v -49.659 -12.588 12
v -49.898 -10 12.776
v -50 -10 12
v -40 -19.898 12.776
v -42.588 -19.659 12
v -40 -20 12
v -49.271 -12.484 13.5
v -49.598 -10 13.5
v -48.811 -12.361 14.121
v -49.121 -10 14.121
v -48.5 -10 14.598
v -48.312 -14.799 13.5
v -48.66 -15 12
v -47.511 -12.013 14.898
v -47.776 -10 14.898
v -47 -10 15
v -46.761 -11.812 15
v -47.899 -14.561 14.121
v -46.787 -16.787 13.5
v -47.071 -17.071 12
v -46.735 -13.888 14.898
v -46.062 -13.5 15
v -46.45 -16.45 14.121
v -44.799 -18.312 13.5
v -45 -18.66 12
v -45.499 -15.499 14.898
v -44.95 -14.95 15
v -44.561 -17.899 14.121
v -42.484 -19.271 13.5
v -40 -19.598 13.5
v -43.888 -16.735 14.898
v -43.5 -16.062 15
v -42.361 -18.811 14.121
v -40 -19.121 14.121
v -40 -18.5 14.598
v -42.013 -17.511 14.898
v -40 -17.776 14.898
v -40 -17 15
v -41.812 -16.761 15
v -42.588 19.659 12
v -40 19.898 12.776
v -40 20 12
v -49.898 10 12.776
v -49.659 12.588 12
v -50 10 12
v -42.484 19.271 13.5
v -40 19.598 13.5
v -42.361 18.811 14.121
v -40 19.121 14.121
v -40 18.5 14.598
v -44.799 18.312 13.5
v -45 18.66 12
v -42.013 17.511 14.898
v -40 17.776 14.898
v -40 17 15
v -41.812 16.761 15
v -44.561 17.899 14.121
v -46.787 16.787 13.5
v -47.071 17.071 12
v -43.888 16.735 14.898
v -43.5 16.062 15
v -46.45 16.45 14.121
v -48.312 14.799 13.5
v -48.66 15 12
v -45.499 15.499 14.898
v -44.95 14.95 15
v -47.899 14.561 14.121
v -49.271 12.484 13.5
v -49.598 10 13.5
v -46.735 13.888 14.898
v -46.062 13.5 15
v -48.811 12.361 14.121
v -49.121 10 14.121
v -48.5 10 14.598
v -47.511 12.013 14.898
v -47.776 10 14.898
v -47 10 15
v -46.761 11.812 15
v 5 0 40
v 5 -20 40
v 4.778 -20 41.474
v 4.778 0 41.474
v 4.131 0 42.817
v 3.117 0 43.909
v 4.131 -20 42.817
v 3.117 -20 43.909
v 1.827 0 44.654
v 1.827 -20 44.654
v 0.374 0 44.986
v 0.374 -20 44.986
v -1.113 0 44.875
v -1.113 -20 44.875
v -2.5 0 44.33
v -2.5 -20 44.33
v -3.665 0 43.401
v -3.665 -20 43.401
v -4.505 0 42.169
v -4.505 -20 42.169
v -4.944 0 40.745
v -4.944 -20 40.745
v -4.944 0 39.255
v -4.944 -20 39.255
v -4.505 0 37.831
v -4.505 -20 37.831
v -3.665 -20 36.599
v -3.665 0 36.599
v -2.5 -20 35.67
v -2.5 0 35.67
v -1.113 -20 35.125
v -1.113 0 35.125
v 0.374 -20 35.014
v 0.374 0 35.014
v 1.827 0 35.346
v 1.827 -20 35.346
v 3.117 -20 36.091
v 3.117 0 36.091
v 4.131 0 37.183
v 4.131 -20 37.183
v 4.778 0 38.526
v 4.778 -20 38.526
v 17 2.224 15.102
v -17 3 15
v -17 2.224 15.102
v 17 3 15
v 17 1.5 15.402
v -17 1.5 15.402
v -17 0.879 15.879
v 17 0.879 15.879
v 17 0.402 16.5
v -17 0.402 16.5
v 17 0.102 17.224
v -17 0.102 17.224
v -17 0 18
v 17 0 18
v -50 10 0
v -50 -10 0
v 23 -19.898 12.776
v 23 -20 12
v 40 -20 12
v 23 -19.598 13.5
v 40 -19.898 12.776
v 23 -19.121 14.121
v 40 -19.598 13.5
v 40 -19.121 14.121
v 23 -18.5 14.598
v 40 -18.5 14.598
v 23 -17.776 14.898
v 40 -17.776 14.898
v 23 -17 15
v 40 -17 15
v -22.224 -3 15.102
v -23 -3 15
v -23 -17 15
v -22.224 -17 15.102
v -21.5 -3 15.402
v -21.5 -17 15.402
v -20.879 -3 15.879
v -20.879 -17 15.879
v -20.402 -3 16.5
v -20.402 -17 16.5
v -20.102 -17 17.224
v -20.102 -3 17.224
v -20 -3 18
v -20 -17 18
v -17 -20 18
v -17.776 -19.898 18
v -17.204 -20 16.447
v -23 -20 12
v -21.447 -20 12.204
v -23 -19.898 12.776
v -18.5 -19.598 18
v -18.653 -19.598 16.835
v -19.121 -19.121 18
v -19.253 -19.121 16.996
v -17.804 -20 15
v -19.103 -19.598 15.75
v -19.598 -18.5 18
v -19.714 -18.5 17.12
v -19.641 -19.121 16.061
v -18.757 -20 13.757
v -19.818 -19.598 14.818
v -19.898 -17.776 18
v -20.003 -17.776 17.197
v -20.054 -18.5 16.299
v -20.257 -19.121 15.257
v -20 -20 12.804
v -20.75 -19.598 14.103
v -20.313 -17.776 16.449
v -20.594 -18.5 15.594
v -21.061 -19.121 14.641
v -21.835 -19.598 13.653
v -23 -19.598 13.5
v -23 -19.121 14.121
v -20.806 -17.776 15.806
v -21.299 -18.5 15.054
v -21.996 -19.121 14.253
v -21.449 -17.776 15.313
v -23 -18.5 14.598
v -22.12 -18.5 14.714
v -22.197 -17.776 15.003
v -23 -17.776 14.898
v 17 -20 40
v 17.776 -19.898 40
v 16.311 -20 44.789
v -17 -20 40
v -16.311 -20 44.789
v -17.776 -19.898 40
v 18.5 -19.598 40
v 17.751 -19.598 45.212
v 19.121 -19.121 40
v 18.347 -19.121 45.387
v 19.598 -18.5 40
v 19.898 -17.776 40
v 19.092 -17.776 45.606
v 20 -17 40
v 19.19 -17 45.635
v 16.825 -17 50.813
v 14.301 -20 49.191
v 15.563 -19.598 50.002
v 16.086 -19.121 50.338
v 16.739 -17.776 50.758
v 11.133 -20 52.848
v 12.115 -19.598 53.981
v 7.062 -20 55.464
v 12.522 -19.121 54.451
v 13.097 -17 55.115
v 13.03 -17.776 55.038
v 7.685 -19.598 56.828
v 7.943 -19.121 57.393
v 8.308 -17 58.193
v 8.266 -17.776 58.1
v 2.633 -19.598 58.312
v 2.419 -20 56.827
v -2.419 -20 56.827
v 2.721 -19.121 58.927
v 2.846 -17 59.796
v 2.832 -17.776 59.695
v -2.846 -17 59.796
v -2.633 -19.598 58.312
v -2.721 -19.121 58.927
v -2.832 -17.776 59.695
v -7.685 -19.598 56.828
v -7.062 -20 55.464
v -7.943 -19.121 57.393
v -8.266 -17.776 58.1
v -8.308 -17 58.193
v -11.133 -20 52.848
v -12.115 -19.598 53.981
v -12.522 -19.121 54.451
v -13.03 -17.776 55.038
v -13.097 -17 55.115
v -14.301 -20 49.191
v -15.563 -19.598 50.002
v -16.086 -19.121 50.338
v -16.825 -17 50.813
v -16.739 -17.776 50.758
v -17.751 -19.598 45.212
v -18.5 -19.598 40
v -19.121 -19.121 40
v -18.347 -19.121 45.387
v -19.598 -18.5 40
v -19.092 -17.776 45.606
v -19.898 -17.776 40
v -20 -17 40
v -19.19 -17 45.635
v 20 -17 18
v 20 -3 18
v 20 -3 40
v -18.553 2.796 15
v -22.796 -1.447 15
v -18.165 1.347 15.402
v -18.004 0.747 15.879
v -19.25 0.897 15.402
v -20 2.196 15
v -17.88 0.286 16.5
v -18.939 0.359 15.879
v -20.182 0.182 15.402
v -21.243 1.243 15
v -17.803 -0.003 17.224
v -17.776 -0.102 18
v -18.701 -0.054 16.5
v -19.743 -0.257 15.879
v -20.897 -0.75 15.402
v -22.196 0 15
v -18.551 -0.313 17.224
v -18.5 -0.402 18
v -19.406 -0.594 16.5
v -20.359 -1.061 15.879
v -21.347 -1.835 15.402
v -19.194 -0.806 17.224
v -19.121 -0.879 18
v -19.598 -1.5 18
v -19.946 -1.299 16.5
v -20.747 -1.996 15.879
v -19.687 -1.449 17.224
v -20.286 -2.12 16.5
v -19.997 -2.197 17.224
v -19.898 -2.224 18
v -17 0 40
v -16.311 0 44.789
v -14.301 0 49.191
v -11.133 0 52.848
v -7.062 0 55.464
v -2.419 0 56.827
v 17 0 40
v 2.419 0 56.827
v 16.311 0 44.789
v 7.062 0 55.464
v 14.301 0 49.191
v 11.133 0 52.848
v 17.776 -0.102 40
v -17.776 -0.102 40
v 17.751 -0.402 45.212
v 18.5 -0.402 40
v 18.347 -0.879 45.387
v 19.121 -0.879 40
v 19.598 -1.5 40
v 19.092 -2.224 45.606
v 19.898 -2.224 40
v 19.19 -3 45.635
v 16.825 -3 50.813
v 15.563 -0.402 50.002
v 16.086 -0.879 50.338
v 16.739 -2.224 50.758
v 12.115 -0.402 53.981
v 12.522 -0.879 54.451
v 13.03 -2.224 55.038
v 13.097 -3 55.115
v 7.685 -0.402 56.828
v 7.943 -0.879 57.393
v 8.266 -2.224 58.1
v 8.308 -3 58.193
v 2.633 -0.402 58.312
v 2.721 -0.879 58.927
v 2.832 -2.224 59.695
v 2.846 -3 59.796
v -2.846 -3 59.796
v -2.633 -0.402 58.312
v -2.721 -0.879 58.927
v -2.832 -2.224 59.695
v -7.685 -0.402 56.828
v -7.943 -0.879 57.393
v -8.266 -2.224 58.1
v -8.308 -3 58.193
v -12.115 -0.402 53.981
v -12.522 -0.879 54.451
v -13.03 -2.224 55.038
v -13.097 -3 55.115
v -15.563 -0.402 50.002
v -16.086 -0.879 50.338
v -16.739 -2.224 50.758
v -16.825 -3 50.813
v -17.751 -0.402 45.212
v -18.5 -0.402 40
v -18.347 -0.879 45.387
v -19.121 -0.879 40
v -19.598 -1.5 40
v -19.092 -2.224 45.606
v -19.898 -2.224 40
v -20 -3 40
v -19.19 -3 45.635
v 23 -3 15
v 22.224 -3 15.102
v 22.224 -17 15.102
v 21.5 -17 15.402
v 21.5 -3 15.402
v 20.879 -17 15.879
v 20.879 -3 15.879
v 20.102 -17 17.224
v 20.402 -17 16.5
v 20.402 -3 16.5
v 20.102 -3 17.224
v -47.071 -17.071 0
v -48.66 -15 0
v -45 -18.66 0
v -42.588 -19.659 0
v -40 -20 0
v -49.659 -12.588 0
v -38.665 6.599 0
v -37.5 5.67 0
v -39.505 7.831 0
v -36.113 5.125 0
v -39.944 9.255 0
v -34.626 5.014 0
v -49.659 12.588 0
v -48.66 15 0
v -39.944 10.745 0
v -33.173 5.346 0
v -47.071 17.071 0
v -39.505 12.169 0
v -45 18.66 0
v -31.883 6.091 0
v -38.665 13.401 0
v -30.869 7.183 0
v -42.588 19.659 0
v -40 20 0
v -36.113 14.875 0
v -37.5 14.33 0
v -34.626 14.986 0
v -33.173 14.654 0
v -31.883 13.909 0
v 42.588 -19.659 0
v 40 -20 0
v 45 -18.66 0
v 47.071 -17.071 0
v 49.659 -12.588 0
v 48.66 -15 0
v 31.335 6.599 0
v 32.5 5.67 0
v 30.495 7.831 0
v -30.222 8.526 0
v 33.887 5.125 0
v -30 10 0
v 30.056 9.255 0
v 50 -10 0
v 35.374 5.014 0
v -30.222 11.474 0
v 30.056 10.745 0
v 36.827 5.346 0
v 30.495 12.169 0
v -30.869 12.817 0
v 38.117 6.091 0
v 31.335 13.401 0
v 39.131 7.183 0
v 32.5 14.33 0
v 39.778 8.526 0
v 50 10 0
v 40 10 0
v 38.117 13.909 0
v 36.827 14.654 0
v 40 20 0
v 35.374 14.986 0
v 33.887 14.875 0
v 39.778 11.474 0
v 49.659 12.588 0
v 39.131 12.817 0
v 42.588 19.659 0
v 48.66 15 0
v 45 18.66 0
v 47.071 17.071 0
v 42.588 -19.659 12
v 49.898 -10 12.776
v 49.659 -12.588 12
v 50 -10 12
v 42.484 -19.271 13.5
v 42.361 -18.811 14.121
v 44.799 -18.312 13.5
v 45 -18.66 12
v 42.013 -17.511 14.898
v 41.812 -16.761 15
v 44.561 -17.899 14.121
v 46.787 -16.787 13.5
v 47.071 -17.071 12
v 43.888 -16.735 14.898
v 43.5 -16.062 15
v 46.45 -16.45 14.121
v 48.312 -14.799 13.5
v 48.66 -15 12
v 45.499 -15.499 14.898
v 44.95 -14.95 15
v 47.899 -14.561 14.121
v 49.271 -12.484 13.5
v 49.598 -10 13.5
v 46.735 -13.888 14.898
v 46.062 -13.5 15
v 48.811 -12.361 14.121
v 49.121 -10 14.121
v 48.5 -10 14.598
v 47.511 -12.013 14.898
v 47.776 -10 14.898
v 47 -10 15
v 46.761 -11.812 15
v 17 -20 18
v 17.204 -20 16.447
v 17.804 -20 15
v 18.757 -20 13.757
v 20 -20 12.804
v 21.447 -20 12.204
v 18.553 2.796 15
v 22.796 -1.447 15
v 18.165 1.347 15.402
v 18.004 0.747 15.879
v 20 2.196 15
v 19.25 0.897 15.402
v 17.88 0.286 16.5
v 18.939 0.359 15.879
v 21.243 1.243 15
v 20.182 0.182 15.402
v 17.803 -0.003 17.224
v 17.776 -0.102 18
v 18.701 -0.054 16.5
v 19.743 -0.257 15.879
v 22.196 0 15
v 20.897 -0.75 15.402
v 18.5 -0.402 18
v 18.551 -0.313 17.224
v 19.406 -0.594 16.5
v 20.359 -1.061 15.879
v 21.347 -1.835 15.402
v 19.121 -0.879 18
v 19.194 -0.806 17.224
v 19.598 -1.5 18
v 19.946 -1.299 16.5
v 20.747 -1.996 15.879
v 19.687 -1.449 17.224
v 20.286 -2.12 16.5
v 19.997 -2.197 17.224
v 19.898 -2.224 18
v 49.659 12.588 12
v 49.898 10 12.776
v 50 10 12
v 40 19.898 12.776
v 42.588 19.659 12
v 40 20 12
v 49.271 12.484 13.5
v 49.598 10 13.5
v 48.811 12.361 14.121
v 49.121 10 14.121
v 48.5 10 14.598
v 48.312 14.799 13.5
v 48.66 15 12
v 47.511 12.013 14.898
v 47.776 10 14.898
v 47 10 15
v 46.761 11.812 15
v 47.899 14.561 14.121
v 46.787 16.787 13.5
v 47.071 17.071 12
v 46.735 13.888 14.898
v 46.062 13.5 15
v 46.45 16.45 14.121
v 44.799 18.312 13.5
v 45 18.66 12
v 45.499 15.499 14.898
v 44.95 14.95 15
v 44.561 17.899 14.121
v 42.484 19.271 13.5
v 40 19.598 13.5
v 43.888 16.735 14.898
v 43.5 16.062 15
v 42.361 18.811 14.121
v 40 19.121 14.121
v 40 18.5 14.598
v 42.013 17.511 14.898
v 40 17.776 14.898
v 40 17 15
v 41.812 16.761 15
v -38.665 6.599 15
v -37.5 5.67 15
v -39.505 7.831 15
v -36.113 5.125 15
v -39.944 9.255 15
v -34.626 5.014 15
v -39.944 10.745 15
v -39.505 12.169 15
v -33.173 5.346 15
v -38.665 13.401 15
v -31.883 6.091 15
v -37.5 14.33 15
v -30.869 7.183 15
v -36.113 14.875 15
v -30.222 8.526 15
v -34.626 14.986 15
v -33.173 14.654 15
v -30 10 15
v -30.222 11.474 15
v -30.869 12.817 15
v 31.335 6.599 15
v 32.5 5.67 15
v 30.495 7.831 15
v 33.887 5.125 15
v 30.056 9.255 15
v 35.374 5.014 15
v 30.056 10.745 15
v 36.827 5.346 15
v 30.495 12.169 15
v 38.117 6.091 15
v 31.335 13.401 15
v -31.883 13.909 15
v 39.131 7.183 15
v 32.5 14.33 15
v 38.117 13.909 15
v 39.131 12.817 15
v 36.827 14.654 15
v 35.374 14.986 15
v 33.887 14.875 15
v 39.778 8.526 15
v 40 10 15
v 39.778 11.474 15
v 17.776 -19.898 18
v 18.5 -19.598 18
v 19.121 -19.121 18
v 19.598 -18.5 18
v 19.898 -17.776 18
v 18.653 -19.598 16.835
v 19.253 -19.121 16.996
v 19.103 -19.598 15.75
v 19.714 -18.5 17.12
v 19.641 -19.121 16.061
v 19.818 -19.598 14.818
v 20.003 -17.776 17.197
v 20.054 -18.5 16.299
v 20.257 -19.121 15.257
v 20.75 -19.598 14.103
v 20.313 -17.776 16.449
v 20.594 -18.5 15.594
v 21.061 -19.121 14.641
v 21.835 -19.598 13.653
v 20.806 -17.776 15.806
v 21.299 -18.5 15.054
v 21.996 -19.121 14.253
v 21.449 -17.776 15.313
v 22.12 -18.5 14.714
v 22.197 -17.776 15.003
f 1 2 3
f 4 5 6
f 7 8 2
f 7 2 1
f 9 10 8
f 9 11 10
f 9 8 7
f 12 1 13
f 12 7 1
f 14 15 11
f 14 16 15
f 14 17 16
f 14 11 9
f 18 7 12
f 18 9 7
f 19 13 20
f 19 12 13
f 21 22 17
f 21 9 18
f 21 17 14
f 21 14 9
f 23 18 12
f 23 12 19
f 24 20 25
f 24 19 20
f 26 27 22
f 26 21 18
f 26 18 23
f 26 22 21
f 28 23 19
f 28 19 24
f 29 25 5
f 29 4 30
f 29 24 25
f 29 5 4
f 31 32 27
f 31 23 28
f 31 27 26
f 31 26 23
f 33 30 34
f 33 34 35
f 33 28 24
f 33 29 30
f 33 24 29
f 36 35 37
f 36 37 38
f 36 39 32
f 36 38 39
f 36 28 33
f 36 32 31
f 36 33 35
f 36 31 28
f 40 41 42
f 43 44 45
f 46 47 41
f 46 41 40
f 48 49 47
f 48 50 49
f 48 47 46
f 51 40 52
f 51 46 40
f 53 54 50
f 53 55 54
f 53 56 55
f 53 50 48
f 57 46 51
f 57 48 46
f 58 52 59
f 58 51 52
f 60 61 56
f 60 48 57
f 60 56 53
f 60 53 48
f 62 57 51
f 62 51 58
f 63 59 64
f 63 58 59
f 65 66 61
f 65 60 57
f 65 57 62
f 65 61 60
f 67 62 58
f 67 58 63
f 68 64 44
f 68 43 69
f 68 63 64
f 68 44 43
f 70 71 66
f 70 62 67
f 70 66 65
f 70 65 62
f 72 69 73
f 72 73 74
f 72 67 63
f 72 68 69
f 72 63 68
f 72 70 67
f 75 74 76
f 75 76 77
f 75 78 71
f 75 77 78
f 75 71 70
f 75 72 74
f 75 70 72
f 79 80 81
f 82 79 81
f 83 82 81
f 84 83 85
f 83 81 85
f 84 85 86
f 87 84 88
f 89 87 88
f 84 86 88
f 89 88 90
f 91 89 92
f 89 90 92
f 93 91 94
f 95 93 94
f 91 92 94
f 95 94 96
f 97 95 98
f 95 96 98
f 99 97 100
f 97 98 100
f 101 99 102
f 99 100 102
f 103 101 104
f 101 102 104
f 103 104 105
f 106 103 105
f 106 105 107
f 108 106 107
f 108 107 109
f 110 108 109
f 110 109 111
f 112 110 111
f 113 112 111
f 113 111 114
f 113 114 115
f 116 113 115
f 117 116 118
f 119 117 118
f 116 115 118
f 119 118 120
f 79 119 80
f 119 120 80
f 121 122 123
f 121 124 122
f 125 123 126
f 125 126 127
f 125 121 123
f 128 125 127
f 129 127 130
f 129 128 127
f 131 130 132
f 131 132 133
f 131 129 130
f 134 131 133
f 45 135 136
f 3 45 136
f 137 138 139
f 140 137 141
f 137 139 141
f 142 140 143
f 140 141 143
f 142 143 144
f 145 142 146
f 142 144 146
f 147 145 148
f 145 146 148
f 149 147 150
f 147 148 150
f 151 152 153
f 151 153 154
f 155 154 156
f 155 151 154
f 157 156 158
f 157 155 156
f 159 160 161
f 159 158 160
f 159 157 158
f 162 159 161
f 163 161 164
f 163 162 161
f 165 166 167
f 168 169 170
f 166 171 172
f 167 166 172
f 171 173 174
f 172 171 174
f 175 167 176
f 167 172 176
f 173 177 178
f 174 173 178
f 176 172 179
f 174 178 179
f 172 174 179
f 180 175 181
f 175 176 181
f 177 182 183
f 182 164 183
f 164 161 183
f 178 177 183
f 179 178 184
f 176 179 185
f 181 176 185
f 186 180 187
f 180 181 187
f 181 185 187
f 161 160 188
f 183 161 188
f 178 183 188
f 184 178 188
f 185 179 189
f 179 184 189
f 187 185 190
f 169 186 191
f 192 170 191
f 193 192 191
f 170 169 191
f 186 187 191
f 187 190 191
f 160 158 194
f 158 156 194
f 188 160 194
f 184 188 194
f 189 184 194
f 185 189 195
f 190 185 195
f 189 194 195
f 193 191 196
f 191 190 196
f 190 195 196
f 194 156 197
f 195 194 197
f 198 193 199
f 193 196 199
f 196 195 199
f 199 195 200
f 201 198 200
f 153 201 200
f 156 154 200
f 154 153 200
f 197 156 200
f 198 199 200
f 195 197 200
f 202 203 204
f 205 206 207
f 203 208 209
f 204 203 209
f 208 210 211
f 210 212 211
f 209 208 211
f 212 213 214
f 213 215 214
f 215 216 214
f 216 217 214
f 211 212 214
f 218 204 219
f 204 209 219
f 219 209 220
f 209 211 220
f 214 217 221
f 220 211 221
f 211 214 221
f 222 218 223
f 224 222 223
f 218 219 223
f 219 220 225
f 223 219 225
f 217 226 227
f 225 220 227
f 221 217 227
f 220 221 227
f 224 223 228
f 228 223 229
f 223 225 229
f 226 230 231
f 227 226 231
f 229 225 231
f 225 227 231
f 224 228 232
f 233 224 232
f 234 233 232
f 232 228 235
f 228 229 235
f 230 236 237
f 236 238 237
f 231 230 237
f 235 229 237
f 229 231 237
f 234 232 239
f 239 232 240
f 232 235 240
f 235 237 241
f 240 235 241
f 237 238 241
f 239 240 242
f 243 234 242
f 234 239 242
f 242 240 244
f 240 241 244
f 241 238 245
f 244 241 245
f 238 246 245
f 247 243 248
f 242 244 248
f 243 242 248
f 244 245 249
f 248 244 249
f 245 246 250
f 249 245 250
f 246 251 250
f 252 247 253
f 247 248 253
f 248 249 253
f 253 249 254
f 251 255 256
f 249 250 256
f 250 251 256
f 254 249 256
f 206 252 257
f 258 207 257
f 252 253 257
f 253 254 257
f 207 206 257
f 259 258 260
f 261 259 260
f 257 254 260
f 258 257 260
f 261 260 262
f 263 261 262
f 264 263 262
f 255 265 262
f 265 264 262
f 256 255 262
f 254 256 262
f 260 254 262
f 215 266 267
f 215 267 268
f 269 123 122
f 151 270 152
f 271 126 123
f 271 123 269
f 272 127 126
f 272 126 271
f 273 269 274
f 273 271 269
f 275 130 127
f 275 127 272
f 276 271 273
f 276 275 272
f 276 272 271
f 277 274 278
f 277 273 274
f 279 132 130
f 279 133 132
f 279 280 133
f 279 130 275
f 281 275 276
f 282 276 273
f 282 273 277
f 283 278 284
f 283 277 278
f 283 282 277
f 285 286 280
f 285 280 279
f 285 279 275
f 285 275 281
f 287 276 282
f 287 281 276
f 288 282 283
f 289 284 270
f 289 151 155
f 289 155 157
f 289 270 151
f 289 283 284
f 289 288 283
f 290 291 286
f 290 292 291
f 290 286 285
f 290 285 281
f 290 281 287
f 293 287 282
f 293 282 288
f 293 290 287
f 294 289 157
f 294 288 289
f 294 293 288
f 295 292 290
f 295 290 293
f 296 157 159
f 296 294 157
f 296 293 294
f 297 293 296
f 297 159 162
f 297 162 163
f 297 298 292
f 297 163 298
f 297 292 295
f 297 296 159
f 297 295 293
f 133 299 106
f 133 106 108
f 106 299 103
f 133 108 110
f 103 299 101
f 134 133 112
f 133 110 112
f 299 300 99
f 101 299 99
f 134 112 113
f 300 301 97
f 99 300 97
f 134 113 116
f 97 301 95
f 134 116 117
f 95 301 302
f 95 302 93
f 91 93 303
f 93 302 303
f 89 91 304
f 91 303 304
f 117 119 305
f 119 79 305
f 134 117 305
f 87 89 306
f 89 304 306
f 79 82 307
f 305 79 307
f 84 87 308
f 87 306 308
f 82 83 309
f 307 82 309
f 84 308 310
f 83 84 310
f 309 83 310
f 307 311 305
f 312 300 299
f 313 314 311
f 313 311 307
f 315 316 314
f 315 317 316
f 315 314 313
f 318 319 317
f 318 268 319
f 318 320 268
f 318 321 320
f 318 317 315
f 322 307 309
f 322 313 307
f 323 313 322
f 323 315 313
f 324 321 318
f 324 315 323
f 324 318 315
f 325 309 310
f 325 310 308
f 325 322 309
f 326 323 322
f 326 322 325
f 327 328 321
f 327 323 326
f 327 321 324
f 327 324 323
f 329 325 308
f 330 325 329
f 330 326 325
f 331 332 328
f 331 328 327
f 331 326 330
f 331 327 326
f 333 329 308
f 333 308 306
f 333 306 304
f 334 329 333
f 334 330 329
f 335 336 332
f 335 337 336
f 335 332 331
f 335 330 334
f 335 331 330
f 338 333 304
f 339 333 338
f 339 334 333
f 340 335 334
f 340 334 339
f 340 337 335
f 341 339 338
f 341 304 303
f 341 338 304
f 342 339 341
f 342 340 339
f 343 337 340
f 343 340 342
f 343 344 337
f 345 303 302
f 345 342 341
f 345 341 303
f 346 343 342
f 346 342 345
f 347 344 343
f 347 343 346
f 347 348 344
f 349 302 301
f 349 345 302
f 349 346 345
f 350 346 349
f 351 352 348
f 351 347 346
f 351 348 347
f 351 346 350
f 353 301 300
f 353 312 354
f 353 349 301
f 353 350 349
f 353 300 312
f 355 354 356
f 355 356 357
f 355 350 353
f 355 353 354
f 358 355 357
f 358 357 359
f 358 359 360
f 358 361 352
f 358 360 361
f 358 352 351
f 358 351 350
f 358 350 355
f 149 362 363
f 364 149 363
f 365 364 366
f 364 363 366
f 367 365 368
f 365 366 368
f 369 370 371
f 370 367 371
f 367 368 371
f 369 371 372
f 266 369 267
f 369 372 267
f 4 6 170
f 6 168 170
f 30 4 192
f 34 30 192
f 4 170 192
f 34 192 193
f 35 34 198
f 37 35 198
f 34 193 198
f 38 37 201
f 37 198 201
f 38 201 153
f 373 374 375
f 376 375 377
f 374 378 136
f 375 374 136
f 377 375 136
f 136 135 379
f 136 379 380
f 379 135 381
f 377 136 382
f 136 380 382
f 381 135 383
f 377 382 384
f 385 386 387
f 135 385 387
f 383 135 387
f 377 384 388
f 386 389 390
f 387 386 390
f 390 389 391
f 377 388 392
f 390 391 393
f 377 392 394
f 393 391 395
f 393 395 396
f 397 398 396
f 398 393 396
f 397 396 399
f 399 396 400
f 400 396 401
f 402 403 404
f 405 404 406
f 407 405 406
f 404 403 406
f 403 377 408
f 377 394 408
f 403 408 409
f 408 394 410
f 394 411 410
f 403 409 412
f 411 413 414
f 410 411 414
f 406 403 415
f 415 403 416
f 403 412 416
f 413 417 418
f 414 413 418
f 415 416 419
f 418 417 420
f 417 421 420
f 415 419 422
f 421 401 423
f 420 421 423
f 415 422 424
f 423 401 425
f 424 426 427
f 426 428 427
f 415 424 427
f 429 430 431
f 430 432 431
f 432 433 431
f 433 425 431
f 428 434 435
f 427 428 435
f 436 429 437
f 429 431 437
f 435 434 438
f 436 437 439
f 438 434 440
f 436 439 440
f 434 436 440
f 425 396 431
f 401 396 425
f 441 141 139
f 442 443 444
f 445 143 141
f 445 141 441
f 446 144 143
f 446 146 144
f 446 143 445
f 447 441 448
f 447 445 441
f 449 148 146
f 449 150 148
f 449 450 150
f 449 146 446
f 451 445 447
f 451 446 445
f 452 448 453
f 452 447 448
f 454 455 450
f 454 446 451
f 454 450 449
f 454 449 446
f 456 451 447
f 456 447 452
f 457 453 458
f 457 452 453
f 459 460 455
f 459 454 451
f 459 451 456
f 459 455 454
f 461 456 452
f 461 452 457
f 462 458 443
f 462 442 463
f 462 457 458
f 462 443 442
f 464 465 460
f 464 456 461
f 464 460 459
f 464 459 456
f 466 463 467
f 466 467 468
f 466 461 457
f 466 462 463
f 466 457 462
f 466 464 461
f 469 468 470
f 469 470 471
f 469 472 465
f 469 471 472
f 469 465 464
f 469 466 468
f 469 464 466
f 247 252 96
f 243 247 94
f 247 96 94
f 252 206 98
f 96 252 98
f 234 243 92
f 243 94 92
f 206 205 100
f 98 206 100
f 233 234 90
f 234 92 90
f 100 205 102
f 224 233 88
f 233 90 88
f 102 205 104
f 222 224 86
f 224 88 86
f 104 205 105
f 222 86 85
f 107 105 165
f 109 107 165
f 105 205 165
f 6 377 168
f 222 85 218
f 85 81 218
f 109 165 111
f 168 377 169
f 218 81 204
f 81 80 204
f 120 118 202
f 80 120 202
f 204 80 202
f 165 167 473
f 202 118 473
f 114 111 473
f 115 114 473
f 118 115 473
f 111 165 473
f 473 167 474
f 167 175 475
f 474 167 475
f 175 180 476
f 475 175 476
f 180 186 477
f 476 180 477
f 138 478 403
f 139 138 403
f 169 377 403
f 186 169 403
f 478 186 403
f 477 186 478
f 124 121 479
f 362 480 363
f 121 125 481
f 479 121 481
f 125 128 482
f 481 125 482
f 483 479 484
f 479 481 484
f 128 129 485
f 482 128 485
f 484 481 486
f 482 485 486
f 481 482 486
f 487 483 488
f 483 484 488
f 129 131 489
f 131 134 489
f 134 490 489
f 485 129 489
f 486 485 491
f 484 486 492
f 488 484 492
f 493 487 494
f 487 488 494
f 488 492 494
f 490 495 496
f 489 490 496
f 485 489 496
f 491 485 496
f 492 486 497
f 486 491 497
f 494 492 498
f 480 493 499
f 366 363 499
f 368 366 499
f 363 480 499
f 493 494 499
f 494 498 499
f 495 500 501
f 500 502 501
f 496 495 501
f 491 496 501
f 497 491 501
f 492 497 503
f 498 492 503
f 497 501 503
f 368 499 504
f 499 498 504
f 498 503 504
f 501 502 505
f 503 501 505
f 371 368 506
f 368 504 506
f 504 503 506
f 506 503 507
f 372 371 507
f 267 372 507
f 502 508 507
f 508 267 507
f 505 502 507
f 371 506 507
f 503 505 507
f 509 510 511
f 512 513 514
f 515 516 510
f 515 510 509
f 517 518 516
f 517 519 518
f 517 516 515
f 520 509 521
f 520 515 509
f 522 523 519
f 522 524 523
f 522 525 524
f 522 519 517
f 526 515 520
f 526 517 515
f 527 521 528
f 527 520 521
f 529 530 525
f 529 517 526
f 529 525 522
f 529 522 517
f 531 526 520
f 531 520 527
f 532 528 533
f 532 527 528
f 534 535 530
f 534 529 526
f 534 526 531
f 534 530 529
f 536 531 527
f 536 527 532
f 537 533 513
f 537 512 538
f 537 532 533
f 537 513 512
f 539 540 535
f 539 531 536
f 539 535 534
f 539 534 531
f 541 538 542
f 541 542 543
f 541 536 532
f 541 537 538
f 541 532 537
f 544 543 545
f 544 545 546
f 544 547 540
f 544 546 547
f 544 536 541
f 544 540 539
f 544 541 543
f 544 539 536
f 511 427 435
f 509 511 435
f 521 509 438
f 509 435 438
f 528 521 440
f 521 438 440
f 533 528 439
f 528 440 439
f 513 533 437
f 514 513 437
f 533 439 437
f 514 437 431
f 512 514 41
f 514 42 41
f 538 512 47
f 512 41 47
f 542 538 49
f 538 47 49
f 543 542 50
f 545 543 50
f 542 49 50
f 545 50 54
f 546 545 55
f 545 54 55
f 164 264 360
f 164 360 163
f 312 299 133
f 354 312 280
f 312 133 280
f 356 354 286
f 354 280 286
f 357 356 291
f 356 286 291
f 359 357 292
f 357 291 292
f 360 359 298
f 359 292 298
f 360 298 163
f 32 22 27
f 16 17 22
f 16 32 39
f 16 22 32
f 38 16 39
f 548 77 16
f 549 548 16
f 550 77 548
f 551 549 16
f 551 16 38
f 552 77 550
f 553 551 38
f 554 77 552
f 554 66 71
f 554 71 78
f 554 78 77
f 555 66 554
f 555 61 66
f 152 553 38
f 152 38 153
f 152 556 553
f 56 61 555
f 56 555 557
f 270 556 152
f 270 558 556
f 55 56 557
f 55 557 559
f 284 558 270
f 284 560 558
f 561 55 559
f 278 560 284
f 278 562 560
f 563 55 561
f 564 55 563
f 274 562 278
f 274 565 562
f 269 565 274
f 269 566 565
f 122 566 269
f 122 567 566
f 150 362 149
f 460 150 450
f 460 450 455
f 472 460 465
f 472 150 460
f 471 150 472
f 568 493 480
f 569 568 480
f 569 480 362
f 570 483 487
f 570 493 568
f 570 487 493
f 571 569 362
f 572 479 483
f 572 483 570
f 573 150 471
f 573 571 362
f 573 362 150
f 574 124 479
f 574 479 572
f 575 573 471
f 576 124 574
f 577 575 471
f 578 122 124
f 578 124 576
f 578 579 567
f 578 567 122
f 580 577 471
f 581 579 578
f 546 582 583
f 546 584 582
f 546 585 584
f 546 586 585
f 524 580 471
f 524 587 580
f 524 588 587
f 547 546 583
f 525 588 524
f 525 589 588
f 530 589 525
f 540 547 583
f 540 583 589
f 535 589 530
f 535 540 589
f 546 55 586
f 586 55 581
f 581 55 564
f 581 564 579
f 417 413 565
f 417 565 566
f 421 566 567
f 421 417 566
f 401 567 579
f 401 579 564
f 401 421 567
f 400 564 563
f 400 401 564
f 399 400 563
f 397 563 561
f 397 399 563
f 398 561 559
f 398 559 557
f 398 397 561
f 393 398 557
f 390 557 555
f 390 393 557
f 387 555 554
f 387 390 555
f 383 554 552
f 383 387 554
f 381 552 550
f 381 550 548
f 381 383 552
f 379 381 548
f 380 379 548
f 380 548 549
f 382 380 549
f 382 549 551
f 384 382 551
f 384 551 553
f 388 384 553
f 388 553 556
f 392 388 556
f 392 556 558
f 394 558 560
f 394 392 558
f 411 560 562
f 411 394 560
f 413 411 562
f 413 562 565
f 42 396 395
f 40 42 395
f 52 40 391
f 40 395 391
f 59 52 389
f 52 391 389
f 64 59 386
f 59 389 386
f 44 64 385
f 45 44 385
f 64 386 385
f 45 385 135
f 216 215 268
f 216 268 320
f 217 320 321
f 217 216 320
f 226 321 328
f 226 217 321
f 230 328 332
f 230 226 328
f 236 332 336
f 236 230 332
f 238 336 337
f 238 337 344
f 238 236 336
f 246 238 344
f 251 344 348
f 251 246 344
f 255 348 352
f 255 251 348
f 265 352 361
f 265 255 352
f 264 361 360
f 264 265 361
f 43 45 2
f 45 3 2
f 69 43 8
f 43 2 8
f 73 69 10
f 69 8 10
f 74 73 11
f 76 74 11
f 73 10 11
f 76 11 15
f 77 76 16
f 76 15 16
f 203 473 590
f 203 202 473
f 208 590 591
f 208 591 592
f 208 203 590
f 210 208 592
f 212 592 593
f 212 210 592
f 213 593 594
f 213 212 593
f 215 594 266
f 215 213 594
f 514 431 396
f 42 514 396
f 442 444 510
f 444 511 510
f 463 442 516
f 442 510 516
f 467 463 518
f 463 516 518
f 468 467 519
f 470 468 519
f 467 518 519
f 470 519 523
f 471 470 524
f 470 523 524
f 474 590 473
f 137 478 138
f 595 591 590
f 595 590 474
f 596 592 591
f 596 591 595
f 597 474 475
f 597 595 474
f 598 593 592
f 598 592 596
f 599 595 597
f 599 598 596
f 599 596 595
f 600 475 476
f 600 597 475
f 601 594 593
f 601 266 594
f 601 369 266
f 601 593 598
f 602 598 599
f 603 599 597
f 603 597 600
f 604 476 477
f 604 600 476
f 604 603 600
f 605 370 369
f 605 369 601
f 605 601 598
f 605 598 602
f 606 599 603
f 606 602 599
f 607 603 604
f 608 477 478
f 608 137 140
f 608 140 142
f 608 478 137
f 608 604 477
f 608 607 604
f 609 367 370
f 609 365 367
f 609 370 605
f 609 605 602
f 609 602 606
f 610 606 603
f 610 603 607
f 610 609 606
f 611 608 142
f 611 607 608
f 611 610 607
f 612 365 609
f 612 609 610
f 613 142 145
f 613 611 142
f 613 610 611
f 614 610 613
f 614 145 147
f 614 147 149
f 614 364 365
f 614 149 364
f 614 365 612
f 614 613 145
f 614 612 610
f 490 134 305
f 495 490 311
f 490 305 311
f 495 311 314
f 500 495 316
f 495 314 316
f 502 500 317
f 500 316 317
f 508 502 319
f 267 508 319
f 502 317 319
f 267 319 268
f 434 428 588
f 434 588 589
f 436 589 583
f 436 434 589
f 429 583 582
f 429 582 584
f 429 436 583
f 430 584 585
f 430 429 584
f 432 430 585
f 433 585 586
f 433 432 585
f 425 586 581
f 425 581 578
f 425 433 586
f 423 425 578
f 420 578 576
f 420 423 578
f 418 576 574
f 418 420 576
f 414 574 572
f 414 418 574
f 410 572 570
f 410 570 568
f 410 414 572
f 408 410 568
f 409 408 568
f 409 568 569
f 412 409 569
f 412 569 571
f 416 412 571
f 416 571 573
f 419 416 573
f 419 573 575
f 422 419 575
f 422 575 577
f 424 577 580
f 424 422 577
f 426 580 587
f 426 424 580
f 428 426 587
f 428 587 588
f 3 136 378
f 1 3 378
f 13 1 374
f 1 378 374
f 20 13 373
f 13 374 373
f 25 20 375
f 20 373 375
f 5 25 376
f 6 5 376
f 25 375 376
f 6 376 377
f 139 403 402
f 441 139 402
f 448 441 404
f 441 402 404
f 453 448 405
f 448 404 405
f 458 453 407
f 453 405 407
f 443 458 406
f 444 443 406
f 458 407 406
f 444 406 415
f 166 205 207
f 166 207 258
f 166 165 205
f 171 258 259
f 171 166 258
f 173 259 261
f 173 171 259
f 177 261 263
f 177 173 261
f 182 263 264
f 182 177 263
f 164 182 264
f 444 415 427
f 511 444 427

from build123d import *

# Parameters (mm, degrees)
F0_R     = 5
F0_W     = 40
F0_H     = 40
F1_DEPTH = 15
F2_R     = 5
F3_DEPTH = 20
F4_R     = 3


with BuildPart() as f1:
    # F0 (on Top) → F1 (new body)
    with BuildSketch(Plane.XY):
        with BuildLine():
            Line((-40, -20), (-20.3233100474, -20))
            Line((-20.3233100474, -20), (-20.3233100474, 20))
            Line((-20.3233100474, 20), (-40, 20))
            ThreePointArc((-40, 20), (-47.0710678119, 17.0710678119), (-50, 10))
            Line((-50, 10), (-50, -10))
            ThreePointArc((-50, -10), (-47.0710678119, -17.0710678119), (-40, -20))
        make_face()
        with Locations((-35, 10)):
            Circle(F0_R, mode=Mode.SUBTRACT)
        with Locations((-0.3233100474, 0)):
            Rectangle(F0_W, F0_H)
        with BuildLine():
            Line((19.6766899526, -20), (40, -20))
            ThreePointArc((40, -20), (47.0710678119, -17.0710678119), (50, -10))
            Line((50, -10), (50, 10))
            ThreePointArc((50, 10), (47.0710678119, 17.0710678119), (40, 20))
            Line((40, 20), (19.6766899526, 20))
            Line((19.6766899526, 20), (19.6766899526, -20))
        make_face()
        with Locations((35, 10)):
            Circle(F0_R, mode=Mode.SUBTRACT)
    extrude(amount=F1_DEPTH)

    # F2 (on face) → F3 (join)
    with BuildSketch(Plane.XZ.offset(20)):
        with BuildLine():
            ThreePointArc((20, 40), (0, 60), (-20, 40))
            Line((-20, 40), (-20, 15))
            Line((-20, 15), (20, 15))
            Line((20, 15), (20, 40))
        make_face()
        with Locations((0, 40)):
            Circle(F2_R, mode=Mode.SUBTRACT)
    extrude(amount=-F3_DEPTH)

    # F4
    f4_edges = [f1.edges().sort_by_distance(p)[0] for p in [
        (0, 0, 60),
        (0, 0, 15),
        (0, -20, 60),
        (-30, -20, 15),
        (-20, -20, 27.5),
        (20, -20, 27.5),
        (30, -20, 15),
        (-47.071068, -17.071068, 15),
        (47.071068, -17.071068, 15),
        (-50, 0, 15),
        (-47.071068, 17.071068, 15),
        (0, 20, 15),
        (47.071068, 17.071068, 15),
        (50, 0, 15),
        (20, -10, 15),
        (-20, -10, 15),
        (20, 0, 27.5),
        (-20, 0, 27.5),
    ]]
    fillet(f4_edges, radius=F4_R)


solid = f1.part
